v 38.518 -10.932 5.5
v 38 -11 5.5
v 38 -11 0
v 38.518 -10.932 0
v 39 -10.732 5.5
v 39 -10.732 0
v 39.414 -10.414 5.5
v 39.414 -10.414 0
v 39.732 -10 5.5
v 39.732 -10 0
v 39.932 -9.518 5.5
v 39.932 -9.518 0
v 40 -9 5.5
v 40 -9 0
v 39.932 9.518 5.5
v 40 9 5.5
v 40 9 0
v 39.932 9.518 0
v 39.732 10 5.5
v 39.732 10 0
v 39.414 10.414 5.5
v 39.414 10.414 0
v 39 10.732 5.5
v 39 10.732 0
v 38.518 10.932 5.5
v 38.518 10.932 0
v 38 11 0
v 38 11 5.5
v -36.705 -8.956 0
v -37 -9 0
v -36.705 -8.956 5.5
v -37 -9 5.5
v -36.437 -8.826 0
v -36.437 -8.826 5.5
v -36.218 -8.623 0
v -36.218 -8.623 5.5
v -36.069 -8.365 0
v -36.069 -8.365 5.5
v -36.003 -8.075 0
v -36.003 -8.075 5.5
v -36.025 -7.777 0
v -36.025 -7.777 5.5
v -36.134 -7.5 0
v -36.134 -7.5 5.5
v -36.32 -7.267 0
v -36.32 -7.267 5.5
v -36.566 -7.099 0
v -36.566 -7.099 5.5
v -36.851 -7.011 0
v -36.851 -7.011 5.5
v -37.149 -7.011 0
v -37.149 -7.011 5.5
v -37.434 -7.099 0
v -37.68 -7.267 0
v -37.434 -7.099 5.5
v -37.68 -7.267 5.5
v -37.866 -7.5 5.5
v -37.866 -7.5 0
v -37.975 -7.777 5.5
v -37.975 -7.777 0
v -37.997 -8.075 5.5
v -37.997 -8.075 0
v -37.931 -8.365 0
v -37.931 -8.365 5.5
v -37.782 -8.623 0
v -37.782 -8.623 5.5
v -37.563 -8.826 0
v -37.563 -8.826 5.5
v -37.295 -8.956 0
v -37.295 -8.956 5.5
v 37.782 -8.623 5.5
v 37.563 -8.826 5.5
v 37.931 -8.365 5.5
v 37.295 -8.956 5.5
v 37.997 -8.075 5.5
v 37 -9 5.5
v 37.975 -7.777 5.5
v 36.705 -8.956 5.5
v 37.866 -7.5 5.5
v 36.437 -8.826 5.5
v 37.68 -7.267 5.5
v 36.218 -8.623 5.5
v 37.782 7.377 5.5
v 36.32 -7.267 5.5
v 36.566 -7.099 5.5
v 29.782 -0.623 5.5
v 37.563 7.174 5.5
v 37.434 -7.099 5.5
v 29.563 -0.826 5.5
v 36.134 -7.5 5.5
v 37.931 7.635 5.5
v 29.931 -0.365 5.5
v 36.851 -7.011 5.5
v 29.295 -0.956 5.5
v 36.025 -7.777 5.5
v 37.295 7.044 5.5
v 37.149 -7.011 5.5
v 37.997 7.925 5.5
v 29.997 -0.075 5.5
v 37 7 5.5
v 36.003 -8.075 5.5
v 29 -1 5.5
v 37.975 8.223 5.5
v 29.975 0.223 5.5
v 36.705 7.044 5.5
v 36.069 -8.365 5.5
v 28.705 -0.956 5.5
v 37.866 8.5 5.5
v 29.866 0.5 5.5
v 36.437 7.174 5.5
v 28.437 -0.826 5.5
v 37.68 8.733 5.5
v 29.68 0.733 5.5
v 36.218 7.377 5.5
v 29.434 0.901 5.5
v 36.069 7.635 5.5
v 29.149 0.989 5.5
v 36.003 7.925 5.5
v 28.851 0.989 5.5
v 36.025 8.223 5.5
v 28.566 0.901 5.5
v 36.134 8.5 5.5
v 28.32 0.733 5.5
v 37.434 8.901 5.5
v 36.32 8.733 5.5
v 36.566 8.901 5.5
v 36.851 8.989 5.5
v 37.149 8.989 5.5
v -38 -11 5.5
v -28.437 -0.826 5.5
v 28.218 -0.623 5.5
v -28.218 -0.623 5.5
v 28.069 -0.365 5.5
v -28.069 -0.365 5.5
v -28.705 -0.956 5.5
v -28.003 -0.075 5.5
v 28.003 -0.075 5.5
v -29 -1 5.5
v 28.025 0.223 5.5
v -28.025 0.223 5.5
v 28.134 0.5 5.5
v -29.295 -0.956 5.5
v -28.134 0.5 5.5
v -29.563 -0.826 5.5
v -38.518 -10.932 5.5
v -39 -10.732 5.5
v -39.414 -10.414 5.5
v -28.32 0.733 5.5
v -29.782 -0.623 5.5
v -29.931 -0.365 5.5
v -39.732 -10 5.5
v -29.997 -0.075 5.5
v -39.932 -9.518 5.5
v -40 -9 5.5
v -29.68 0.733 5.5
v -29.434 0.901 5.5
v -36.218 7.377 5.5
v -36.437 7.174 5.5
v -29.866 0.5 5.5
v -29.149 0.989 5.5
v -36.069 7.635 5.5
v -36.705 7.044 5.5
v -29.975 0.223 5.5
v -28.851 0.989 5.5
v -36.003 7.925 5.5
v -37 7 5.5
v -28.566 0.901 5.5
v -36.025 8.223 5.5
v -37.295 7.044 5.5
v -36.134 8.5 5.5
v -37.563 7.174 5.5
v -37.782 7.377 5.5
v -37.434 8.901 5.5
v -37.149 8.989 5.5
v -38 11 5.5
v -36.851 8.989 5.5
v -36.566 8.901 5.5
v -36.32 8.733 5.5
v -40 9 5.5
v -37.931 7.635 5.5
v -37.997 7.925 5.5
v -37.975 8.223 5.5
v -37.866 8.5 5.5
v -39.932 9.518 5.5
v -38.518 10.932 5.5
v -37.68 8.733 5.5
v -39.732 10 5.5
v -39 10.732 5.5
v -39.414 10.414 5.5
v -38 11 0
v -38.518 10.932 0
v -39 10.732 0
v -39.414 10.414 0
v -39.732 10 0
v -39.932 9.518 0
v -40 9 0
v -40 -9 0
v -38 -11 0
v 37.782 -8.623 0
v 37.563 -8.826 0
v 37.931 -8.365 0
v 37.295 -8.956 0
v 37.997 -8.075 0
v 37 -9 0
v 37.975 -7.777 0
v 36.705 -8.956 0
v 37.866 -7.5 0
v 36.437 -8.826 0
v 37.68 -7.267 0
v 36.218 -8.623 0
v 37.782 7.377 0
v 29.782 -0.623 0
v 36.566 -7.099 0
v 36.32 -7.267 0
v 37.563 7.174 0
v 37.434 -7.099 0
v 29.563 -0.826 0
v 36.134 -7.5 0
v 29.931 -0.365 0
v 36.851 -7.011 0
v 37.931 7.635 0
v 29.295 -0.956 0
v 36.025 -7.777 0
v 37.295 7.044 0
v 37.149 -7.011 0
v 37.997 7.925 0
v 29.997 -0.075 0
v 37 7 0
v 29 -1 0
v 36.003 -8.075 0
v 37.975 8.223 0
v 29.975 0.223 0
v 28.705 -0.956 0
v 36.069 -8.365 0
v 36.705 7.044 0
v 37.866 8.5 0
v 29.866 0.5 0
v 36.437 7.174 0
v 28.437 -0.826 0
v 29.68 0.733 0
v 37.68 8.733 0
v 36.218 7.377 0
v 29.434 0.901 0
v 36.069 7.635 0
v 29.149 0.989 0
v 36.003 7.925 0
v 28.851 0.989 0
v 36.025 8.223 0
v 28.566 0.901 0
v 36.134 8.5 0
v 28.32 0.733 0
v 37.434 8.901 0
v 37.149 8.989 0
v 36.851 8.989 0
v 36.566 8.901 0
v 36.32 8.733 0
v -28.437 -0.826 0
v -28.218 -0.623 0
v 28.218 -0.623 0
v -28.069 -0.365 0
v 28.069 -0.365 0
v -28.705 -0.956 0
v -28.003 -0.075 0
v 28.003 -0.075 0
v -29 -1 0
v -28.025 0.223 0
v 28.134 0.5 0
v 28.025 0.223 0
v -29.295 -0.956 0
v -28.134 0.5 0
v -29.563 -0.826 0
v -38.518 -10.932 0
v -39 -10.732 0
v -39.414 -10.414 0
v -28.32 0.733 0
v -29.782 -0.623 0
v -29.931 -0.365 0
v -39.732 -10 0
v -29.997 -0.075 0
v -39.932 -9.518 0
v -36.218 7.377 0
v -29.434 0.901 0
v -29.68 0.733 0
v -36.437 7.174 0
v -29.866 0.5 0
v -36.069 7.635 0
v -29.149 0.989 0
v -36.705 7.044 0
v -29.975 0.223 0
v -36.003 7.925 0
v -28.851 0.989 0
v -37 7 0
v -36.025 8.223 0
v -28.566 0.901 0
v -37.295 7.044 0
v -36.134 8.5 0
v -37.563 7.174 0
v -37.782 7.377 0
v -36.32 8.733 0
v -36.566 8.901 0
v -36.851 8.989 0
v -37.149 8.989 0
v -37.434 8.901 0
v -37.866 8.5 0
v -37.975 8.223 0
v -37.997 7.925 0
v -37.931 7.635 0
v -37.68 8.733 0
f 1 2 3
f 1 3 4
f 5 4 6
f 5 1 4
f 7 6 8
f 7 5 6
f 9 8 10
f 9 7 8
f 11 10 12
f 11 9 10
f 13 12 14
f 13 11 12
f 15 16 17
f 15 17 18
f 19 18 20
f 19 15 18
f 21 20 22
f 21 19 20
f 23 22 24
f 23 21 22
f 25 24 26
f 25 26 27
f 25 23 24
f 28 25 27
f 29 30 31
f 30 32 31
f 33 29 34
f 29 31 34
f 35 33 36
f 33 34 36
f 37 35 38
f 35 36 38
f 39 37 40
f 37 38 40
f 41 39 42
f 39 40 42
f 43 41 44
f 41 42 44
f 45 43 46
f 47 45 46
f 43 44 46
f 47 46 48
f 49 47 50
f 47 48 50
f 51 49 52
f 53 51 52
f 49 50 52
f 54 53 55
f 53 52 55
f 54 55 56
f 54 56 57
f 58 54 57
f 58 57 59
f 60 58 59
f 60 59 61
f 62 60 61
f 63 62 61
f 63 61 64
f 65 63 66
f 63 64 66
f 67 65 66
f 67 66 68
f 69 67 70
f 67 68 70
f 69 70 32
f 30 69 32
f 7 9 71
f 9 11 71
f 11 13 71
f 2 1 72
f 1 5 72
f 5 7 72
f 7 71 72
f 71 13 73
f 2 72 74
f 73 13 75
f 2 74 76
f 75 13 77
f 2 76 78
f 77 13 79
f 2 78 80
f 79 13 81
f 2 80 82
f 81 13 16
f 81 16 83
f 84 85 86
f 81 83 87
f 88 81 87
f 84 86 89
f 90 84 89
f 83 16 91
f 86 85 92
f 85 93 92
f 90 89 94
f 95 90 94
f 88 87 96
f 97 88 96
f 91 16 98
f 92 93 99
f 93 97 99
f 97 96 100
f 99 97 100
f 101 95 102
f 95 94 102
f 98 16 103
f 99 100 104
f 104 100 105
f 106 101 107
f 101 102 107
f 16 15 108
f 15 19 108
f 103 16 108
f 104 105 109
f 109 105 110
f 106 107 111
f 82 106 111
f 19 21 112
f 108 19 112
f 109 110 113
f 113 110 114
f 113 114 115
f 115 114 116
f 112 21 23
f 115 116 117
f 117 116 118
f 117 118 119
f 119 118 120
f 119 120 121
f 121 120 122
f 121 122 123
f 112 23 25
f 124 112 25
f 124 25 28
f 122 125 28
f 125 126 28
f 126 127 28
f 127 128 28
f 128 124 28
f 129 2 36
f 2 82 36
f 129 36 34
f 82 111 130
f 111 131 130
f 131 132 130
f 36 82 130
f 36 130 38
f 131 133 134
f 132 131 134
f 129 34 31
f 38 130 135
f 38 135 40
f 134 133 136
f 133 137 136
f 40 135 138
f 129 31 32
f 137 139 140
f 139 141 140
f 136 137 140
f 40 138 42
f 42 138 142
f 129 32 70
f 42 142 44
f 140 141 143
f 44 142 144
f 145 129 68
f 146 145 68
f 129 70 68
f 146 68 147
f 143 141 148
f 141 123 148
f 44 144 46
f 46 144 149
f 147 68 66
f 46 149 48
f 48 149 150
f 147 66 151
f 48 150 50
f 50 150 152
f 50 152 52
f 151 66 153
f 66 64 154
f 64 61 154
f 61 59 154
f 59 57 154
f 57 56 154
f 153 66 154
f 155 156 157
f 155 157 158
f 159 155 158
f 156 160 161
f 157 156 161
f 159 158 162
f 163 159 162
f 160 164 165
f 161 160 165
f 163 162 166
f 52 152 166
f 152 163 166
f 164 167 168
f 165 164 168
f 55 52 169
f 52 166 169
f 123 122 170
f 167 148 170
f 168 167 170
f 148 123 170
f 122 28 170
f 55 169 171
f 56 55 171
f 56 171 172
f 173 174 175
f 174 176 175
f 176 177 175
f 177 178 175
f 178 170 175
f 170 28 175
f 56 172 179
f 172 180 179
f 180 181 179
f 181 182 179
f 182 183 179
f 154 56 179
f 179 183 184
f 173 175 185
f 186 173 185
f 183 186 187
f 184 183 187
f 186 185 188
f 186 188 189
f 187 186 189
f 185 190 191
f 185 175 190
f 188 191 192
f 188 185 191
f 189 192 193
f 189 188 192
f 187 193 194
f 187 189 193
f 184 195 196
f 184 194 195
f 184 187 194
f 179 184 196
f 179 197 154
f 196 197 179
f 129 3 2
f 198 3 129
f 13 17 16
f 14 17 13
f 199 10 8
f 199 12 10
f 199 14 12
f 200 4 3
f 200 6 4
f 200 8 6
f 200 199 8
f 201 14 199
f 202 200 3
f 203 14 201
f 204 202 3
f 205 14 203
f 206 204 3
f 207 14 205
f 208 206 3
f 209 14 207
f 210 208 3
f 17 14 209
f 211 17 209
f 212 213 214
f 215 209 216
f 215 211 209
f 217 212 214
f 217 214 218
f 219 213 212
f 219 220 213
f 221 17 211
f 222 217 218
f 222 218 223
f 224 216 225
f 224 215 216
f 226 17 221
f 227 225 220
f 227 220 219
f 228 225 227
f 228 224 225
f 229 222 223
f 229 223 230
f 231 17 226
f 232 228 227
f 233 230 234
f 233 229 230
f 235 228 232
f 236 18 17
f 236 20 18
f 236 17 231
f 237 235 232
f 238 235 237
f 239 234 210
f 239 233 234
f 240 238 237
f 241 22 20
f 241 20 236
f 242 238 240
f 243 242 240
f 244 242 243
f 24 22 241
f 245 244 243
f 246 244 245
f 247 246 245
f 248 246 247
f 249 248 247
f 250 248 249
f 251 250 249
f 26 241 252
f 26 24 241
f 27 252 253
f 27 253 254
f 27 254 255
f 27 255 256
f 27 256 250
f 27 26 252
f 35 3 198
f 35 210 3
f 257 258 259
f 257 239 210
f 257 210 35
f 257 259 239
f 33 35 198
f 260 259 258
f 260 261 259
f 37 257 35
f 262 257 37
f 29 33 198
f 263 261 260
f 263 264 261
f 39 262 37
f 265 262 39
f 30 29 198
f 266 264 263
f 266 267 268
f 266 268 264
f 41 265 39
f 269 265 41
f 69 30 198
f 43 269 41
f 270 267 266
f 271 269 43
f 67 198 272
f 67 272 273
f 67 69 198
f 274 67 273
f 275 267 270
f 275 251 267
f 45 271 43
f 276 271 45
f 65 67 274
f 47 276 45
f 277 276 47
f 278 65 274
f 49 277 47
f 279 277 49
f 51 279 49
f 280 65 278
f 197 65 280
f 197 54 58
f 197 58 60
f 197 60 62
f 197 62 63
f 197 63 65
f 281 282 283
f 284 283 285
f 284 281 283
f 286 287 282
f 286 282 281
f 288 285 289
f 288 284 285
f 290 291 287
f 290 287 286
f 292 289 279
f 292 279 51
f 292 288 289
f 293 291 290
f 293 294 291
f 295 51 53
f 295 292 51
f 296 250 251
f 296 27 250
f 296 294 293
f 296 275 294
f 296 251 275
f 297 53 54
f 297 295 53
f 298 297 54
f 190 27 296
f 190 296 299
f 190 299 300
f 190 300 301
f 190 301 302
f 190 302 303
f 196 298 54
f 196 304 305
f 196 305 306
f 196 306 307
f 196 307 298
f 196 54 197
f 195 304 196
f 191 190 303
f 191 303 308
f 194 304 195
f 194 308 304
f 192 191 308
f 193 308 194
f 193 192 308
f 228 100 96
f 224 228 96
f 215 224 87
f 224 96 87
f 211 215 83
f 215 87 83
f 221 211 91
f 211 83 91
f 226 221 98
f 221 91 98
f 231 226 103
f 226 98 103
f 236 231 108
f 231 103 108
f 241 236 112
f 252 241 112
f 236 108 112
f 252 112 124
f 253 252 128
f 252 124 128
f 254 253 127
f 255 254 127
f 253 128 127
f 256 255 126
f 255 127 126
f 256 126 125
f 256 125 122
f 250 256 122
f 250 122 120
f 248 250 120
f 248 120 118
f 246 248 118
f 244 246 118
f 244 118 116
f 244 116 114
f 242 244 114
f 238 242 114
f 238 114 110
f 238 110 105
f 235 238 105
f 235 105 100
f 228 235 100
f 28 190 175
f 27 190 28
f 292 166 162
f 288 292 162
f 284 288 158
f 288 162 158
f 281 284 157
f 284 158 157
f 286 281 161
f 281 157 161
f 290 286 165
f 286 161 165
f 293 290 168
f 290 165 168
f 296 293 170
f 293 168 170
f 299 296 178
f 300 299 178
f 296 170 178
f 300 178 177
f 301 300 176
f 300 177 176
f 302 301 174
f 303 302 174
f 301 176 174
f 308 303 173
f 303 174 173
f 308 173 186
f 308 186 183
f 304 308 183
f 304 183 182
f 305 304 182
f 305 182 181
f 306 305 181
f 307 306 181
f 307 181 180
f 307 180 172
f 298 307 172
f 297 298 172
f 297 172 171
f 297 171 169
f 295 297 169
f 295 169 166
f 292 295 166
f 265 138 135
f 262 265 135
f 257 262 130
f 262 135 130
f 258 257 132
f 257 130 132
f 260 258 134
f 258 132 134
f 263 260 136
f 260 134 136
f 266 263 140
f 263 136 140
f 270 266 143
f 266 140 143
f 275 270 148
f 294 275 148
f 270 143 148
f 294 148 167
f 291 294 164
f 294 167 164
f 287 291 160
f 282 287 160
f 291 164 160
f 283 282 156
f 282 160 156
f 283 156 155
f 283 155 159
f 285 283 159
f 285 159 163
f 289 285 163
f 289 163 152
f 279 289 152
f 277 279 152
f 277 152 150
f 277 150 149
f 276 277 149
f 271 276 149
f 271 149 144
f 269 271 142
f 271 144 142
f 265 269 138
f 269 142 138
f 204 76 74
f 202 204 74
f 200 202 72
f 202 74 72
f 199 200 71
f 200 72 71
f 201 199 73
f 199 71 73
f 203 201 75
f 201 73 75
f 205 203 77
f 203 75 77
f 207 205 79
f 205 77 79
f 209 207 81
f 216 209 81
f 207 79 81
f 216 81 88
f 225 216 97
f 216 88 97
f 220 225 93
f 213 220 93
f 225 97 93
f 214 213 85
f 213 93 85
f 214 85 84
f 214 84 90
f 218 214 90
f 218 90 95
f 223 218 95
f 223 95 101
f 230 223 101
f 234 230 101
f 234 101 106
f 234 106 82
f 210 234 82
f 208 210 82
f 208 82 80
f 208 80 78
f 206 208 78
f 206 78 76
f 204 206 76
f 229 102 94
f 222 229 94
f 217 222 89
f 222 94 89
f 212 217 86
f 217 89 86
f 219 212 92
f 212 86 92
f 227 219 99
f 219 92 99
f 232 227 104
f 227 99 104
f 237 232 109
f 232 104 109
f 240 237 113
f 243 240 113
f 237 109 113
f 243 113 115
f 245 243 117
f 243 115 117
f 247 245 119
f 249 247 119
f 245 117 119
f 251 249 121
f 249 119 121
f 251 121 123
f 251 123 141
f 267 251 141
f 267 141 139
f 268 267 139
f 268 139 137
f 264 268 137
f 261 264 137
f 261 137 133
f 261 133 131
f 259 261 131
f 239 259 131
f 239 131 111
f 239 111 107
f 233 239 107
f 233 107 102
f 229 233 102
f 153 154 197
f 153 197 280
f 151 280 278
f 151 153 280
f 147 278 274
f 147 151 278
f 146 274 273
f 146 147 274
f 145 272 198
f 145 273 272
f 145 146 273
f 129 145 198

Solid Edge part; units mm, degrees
sketch "Sketch1" plane through (0, 0, 0) normal (0, 0, 1) x (1, 0, 0)
  line L0 (40, -11) -> (-40, -11)
  line L1 (-40, -11) -> (-40, 11)
  line L2 (-40, 11) -> (40, 11)
  line L3 (40, 11) -> (40, -11)
  dimension "D1" = 80
  dimension "D2" = 22
extrude "Protrusion1" add sketch "Sketch1" along normal blind 5.5
hole "Hole_1" at (37, 8, 5.5) direction (0, 0, -1) diameter 2 end through all
hole "Hole1" at (37, -8, 5.5) direction (0, 0, -1) diameter 2 end through all
hole "Hole2" at (-37, 8, 5.5) direction (0, 0, -1) diameter 2 end through all
hole "Hole3" at (-37, -8, 5.5) direction (0, 0, -1) diameter 2 end through all
hole "Hole4" at (-29, 0, 5.5) direction (0, 0, -1) diameter 2 end through all
hole "Hole5" at (29, 0, 5.5) direction (0, 0, -1) diameter 2 end through all
fillet "Round_1" radius 2 3 edges at (-40, 11, 2.75) (-40, -11, 2.75) (40, -11, 2.75)
fillet "Round_2" radius 2 1 edges at (40, 11, 2.75)
properties material "木材, アッシュ"
